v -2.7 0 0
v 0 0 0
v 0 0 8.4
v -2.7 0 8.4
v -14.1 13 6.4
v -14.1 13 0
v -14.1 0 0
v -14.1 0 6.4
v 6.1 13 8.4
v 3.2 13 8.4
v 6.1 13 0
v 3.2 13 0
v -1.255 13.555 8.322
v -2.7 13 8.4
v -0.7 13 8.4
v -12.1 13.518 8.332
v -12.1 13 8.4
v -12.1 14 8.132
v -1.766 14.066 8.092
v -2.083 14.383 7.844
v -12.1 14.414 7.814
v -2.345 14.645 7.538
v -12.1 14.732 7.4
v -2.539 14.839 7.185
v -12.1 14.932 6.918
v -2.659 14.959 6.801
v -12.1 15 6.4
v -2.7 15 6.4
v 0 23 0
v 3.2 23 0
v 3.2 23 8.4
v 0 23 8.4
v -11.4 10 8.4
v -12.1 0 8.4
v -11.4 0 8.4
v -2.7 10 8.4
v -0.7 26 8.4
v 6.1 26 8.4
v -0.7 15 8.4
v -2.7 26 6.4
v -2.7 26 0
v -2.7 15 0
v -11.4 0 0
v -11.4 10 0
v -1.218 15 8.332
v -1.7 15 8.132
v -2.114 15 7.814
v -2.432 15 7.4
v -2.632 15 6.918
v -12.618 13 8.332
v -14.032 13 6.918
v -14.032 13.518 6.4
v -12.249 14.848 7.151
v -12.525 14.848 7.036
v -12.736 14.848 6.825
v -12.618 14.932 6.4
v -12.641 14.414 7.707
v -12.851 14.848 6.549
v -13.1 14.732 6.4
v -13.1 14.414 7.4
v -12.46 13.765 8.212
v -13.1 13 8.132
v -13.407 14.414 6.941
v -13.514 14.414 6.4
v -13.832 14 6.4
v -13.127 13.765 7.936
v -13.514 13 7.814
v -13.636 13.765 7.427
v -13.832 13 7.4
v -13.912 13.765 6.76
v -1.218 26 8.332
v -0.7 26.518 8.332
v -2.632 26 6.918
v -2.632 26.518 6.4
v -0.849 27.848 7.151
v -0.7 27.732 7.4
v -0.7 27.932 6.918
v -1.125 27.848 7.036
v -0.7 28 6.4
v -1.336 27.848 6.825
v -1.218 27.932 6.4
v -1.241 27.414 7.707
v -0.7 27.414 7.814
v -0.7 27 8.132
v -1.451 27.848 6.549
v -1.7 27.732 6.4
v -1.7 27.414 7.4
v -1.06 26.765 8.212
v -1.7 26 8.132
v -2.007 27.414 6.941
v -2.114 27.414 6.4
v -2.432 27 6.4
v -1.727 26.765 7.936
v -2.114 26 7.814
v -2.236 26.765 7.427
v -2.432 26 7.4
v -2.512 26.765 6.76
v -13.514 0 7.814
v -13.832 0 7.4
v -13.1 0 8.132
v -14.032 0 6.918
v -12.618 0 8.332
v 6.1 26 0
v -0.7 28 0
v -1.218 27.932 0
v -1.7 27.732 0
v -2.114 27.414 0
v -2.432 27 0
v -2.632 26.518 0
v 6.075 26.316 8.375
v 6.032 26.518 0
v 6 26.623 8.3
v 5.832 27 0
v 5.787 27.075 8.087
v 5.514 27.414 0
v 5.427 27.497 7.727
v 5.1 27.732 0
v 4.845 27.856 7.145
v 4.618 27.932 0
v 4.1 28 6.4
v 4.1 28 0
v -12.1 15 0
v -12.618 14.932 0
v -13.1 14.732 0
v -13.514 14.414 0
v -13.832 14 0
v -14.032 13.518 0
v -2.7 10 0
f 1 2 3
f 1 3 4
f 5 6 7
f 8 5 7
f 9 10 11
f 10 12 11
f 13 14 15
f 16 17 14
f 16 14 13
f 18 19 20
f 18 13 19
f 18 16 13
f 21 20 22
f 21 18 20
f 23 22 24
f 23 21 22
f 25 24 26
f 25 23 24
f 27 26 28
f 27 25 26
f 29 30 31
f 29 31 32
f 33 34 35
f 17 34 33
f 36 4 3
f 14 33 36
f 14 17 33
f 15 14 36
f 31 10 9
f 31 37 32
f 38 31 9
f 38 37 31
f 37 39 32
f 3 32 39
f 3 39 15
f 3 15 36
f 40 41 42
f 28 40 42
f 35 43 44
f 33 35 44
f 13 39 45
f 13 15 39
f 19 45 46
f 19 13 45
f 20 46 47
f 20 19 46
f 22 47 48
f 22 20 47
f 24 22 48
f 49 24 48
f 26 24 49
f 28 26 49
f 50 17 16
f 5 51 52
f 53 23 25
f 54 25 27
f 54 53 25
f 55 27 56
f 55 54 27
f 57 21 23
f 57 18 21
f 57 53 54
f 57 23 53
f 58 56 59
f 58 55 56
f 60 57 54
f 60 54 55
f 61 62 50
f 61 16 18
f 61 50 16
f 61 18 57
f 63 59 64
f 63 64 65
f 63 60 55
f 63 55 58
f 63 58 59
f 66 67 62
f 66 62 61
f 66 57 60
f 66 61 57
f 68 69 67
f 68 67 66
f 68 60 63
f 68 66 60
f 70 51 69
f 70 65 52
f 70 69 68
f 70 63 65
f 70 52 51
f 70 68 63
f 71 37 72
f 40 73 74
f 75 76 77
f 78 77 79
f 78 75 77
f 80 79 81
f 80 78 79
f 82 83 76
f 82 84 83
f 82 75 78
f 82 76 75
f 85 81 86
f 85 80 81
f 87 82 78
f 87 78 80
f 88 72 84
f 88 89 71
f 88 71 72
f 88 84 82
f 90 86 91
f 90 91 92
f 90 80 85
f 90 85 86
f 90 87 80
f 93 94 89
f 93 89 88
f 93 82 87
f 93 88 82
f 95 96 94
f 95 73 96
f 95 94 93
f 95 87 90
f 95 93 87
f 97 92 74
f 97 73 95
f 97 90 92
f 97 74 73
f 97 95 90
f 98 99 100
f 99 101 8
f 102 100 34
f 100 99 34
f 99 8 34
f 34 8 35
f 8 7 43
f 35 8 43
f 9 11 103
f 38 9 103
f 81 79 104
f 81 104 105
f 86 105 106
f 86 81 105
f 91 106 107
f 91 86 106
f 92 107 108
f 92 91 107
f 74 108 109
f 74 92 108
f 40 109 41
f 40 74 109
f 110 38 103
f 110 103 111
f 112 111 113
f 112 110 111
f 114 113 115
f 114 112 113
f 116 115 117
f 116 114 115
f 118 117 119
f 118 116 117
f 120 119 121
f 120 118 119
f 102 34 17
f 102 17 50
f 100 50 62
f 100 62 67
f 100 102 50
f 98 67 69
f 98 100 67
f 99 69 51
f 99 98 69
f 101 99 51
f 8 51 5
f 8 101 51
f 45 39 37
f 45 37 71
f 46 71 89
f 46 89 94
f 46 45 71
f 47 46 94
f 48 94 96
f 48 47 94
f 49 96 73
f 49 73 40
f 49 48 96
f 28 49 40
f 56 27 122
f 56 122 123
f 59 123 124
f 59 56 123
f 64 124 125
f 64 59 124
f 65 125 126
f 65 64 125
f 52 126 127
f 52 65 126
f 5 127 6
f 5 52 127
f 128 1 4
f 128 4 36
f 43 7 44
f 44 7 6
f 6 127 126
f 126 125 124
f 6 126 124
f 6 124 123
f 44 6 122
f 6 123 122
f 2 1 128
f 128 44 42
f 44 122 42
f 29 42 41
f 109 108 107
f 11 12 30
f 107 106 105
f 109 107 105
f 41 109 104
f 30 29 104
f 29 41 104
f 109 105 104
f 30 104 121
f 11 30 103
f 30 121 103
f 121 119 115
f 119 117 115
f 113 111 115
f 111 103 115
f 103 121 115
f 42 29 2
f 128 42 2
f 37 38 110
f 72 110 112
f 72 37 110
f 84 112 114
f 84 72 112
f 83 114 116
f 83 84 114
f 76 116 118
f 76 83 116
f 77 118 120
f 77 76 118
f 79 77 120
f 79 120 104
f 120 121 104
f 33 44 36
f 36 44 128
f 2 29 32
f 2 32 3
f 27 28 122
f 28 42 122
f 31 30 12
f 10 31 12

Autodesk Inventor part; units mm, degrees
ref_plane "YZ Plane" through (0, 0, 0) normal (1, 0, 0) x (0, 1, 0)
ref_plane "XZ Plane" through (0, 0, 0) normal (0, 1, 0) x (-1, 0, 0)
ref_plane "XY Plane" through (0, 0, 0) normal (0, 0, 1) x (1, 0, 0)
sketch "Sketch1" plane through (0, 0, 0) normal (0, 0, 1) x (1, 0, 0)
  line L0 (0, 0) -> (-8.7, 0)
  line L1 (-8.7, 0) -> (-8.7, 8.7)
  line L2 (-8.7, 8.7) -> (0, 8.7)
  line L3 (0, 8.7) -> (0, 0)
  dimension "d0" = 8.7
  dimension "d1" = 8.7
extrude "Extrusion1" [suppressed]
sketch "Sketch2" plane through (-8.7, 0, 0) normal (-1, 0, 0) x (0, 0, 1)
  line L0 (0, 8.7) -> (0, 0) projected
  line L1 (0, 0) -> (3, 0)
  line L2 (3, 0) -> (3, 8.7)
  line L3 (3, 8.7) -> (0, 8.7)
  line L4 (0, 8.7) -> (0, 0)
extrude "Extrusion2" [suppressed]
sketch "Sketch3" plane through (0, 0, 3) normal (0, 0, 1) x (1, 0, 0)
  line L0 (0, 8.7) -> (-11.7, 8.7) projected
  line L1 (0, 0) -> (-11.7, 0) projected
  line L2 (-11.7, 8.7) -> (-8.7, 8.7)
  line L3 (-8.7, 8.7) -> (-8.7, 0)
  line L4 (-8.7, 0) -> (-11.7, 0)
  line L5 (-11.7, 0) -> (-11.7, 8.7)
  dimension "d6" = 3
extrude "Extrusion3" [suppressed]
sketch "Sketch5" plane through (0, 0, 0) normal (1, 0, 0) x (0, 0, -1)
  line L0 (0, 8.7) -> (-3, 8.7) projected
  line L1 (0, 0) -> (-3, 0)
  line L2 (-3, 0) -> (-3, 8.7)
  line L3 (-3, 8.7) -> (0, 8.7)
  line L4 (0, 8.7) -> (0, 0)
  dimension "d9" = 3
extrude "Extrusion4" [suppressed]
sketch "Sketch6" plane through (0, 0, 3) normal (0, 0, 1) x (1, 0, 0)
  line L0 (3, 8.7) -> (-11.7, 8.7) projected
  line L1 (3, 8.7) -> (0, 8.7)
  line L2 (0, 8.7) -> (0, 0)
  line L3 (0, 0) -> (3, 0)
  line L4 (3, 0) -> (3, 8.7)
extrude "Extrusion5" [suppressed]
sketch "Sketch7" plane through (0, 0, 0) normal (0, 0, 1) x (1, 0, 0)
  line L0 (0, 0) -> (-2.7, 0)
  line L1 (-2.7, 0) -> (-2.7, 15)
  line L2 (-2.7, 15) -> (0, 15)
  line L3 (0, 15) -> (0, 0)
  line L4 (-2.7, 15) -> (-11.4, 15)
  line L5 (-11.4, 15) -> (-11.4, 10)
  line L6 (-11.4, 10) -> (-2.7, 10)
  line L7 (-2.7, 10) -> (-2.7, 15)
  line L8 (-11.4, 15) -> (-14.1, 15)
  line L9 (-14.1, 15) -> (-14.1, 0)
  line L10 (-14.1, 0) -> (-11.4, 0)
  line L11 (-11.4, 0) -> (-11.4, 15)
  line L12 (-2.7, 15) -> (0, 15)
  line L13 (0, 15) -> (0, 23)
  line L14 (0, 23) -> (-2.7, 23)
  line L15 (-2.7, 23) -> (-2.7, 15)
  line L16 (-2.7, 23) -> (0, 23)
  line L17 (0, 23) -> (0, 28)
  line L18 (0, 28) -> (-2.7, 28)
  line L19 (-2.7, 28) -> (-2.7, 23)
  line L20 (0, 28) -> (3.2, 28)
  line L21 (3.2, 28) -> (3.2, 23)
  line L22 (3.2, 23) -> (0, 23)
  line L23 (0, 23) -> (0, 28)
  line L24 (3.2, 28) -> (6.1, 28)
  line L25 (6.1, 28) -> (6.1, 23)
  line L26 (6.1, 23) -> (3.2, 23)
  line L27 (3.2, 23) -> (3.2, 28)
  line L28 (6.1, 23) -> (3.2, 23)
  line L29 (3.2, 23) -> (3.2, 13)
  line L30 (3.2, 13) -> (6.1, 13)
  line L31 (6.1, 13) -> (6.1, 23)
  point P0 (-11.4, 10)
  point P1 (-2.7, 10)
  dimension "d14" = 2.7
  dimension "d15" = 15
  dimension "d16" = 8.7
  dimension "d17" = 5
  dimension "d18" = 2.7
  dimension "d19" = 15
  dimension "d23" = 2.7
  dimension "d24" = 8
  dimension "d25" = 5
  dimension "d26" = 3.2
  dimension "d27" = 5
  dimension "d28" = 2.9
  dimension "d29" = 2.9
  dimension "d30" = 10
extrude "Extrusion6" add sketch "Sketch7" along normal blind 8.4
fillet "Fillet1" radius 2 3 edges at (-14.1, 7.5, 8.4) (-8.4, 15, 8.4) (-14.1, 15, 4.2)
fillet "Fillet2" radius 2 4 edges at (-2.7, 21.5, 8.4) (1.7, 28, 8.4) (6.1, 28, 4.2) (-2.7, 28, 4.2)
properties part number "Hook_TestFit"
